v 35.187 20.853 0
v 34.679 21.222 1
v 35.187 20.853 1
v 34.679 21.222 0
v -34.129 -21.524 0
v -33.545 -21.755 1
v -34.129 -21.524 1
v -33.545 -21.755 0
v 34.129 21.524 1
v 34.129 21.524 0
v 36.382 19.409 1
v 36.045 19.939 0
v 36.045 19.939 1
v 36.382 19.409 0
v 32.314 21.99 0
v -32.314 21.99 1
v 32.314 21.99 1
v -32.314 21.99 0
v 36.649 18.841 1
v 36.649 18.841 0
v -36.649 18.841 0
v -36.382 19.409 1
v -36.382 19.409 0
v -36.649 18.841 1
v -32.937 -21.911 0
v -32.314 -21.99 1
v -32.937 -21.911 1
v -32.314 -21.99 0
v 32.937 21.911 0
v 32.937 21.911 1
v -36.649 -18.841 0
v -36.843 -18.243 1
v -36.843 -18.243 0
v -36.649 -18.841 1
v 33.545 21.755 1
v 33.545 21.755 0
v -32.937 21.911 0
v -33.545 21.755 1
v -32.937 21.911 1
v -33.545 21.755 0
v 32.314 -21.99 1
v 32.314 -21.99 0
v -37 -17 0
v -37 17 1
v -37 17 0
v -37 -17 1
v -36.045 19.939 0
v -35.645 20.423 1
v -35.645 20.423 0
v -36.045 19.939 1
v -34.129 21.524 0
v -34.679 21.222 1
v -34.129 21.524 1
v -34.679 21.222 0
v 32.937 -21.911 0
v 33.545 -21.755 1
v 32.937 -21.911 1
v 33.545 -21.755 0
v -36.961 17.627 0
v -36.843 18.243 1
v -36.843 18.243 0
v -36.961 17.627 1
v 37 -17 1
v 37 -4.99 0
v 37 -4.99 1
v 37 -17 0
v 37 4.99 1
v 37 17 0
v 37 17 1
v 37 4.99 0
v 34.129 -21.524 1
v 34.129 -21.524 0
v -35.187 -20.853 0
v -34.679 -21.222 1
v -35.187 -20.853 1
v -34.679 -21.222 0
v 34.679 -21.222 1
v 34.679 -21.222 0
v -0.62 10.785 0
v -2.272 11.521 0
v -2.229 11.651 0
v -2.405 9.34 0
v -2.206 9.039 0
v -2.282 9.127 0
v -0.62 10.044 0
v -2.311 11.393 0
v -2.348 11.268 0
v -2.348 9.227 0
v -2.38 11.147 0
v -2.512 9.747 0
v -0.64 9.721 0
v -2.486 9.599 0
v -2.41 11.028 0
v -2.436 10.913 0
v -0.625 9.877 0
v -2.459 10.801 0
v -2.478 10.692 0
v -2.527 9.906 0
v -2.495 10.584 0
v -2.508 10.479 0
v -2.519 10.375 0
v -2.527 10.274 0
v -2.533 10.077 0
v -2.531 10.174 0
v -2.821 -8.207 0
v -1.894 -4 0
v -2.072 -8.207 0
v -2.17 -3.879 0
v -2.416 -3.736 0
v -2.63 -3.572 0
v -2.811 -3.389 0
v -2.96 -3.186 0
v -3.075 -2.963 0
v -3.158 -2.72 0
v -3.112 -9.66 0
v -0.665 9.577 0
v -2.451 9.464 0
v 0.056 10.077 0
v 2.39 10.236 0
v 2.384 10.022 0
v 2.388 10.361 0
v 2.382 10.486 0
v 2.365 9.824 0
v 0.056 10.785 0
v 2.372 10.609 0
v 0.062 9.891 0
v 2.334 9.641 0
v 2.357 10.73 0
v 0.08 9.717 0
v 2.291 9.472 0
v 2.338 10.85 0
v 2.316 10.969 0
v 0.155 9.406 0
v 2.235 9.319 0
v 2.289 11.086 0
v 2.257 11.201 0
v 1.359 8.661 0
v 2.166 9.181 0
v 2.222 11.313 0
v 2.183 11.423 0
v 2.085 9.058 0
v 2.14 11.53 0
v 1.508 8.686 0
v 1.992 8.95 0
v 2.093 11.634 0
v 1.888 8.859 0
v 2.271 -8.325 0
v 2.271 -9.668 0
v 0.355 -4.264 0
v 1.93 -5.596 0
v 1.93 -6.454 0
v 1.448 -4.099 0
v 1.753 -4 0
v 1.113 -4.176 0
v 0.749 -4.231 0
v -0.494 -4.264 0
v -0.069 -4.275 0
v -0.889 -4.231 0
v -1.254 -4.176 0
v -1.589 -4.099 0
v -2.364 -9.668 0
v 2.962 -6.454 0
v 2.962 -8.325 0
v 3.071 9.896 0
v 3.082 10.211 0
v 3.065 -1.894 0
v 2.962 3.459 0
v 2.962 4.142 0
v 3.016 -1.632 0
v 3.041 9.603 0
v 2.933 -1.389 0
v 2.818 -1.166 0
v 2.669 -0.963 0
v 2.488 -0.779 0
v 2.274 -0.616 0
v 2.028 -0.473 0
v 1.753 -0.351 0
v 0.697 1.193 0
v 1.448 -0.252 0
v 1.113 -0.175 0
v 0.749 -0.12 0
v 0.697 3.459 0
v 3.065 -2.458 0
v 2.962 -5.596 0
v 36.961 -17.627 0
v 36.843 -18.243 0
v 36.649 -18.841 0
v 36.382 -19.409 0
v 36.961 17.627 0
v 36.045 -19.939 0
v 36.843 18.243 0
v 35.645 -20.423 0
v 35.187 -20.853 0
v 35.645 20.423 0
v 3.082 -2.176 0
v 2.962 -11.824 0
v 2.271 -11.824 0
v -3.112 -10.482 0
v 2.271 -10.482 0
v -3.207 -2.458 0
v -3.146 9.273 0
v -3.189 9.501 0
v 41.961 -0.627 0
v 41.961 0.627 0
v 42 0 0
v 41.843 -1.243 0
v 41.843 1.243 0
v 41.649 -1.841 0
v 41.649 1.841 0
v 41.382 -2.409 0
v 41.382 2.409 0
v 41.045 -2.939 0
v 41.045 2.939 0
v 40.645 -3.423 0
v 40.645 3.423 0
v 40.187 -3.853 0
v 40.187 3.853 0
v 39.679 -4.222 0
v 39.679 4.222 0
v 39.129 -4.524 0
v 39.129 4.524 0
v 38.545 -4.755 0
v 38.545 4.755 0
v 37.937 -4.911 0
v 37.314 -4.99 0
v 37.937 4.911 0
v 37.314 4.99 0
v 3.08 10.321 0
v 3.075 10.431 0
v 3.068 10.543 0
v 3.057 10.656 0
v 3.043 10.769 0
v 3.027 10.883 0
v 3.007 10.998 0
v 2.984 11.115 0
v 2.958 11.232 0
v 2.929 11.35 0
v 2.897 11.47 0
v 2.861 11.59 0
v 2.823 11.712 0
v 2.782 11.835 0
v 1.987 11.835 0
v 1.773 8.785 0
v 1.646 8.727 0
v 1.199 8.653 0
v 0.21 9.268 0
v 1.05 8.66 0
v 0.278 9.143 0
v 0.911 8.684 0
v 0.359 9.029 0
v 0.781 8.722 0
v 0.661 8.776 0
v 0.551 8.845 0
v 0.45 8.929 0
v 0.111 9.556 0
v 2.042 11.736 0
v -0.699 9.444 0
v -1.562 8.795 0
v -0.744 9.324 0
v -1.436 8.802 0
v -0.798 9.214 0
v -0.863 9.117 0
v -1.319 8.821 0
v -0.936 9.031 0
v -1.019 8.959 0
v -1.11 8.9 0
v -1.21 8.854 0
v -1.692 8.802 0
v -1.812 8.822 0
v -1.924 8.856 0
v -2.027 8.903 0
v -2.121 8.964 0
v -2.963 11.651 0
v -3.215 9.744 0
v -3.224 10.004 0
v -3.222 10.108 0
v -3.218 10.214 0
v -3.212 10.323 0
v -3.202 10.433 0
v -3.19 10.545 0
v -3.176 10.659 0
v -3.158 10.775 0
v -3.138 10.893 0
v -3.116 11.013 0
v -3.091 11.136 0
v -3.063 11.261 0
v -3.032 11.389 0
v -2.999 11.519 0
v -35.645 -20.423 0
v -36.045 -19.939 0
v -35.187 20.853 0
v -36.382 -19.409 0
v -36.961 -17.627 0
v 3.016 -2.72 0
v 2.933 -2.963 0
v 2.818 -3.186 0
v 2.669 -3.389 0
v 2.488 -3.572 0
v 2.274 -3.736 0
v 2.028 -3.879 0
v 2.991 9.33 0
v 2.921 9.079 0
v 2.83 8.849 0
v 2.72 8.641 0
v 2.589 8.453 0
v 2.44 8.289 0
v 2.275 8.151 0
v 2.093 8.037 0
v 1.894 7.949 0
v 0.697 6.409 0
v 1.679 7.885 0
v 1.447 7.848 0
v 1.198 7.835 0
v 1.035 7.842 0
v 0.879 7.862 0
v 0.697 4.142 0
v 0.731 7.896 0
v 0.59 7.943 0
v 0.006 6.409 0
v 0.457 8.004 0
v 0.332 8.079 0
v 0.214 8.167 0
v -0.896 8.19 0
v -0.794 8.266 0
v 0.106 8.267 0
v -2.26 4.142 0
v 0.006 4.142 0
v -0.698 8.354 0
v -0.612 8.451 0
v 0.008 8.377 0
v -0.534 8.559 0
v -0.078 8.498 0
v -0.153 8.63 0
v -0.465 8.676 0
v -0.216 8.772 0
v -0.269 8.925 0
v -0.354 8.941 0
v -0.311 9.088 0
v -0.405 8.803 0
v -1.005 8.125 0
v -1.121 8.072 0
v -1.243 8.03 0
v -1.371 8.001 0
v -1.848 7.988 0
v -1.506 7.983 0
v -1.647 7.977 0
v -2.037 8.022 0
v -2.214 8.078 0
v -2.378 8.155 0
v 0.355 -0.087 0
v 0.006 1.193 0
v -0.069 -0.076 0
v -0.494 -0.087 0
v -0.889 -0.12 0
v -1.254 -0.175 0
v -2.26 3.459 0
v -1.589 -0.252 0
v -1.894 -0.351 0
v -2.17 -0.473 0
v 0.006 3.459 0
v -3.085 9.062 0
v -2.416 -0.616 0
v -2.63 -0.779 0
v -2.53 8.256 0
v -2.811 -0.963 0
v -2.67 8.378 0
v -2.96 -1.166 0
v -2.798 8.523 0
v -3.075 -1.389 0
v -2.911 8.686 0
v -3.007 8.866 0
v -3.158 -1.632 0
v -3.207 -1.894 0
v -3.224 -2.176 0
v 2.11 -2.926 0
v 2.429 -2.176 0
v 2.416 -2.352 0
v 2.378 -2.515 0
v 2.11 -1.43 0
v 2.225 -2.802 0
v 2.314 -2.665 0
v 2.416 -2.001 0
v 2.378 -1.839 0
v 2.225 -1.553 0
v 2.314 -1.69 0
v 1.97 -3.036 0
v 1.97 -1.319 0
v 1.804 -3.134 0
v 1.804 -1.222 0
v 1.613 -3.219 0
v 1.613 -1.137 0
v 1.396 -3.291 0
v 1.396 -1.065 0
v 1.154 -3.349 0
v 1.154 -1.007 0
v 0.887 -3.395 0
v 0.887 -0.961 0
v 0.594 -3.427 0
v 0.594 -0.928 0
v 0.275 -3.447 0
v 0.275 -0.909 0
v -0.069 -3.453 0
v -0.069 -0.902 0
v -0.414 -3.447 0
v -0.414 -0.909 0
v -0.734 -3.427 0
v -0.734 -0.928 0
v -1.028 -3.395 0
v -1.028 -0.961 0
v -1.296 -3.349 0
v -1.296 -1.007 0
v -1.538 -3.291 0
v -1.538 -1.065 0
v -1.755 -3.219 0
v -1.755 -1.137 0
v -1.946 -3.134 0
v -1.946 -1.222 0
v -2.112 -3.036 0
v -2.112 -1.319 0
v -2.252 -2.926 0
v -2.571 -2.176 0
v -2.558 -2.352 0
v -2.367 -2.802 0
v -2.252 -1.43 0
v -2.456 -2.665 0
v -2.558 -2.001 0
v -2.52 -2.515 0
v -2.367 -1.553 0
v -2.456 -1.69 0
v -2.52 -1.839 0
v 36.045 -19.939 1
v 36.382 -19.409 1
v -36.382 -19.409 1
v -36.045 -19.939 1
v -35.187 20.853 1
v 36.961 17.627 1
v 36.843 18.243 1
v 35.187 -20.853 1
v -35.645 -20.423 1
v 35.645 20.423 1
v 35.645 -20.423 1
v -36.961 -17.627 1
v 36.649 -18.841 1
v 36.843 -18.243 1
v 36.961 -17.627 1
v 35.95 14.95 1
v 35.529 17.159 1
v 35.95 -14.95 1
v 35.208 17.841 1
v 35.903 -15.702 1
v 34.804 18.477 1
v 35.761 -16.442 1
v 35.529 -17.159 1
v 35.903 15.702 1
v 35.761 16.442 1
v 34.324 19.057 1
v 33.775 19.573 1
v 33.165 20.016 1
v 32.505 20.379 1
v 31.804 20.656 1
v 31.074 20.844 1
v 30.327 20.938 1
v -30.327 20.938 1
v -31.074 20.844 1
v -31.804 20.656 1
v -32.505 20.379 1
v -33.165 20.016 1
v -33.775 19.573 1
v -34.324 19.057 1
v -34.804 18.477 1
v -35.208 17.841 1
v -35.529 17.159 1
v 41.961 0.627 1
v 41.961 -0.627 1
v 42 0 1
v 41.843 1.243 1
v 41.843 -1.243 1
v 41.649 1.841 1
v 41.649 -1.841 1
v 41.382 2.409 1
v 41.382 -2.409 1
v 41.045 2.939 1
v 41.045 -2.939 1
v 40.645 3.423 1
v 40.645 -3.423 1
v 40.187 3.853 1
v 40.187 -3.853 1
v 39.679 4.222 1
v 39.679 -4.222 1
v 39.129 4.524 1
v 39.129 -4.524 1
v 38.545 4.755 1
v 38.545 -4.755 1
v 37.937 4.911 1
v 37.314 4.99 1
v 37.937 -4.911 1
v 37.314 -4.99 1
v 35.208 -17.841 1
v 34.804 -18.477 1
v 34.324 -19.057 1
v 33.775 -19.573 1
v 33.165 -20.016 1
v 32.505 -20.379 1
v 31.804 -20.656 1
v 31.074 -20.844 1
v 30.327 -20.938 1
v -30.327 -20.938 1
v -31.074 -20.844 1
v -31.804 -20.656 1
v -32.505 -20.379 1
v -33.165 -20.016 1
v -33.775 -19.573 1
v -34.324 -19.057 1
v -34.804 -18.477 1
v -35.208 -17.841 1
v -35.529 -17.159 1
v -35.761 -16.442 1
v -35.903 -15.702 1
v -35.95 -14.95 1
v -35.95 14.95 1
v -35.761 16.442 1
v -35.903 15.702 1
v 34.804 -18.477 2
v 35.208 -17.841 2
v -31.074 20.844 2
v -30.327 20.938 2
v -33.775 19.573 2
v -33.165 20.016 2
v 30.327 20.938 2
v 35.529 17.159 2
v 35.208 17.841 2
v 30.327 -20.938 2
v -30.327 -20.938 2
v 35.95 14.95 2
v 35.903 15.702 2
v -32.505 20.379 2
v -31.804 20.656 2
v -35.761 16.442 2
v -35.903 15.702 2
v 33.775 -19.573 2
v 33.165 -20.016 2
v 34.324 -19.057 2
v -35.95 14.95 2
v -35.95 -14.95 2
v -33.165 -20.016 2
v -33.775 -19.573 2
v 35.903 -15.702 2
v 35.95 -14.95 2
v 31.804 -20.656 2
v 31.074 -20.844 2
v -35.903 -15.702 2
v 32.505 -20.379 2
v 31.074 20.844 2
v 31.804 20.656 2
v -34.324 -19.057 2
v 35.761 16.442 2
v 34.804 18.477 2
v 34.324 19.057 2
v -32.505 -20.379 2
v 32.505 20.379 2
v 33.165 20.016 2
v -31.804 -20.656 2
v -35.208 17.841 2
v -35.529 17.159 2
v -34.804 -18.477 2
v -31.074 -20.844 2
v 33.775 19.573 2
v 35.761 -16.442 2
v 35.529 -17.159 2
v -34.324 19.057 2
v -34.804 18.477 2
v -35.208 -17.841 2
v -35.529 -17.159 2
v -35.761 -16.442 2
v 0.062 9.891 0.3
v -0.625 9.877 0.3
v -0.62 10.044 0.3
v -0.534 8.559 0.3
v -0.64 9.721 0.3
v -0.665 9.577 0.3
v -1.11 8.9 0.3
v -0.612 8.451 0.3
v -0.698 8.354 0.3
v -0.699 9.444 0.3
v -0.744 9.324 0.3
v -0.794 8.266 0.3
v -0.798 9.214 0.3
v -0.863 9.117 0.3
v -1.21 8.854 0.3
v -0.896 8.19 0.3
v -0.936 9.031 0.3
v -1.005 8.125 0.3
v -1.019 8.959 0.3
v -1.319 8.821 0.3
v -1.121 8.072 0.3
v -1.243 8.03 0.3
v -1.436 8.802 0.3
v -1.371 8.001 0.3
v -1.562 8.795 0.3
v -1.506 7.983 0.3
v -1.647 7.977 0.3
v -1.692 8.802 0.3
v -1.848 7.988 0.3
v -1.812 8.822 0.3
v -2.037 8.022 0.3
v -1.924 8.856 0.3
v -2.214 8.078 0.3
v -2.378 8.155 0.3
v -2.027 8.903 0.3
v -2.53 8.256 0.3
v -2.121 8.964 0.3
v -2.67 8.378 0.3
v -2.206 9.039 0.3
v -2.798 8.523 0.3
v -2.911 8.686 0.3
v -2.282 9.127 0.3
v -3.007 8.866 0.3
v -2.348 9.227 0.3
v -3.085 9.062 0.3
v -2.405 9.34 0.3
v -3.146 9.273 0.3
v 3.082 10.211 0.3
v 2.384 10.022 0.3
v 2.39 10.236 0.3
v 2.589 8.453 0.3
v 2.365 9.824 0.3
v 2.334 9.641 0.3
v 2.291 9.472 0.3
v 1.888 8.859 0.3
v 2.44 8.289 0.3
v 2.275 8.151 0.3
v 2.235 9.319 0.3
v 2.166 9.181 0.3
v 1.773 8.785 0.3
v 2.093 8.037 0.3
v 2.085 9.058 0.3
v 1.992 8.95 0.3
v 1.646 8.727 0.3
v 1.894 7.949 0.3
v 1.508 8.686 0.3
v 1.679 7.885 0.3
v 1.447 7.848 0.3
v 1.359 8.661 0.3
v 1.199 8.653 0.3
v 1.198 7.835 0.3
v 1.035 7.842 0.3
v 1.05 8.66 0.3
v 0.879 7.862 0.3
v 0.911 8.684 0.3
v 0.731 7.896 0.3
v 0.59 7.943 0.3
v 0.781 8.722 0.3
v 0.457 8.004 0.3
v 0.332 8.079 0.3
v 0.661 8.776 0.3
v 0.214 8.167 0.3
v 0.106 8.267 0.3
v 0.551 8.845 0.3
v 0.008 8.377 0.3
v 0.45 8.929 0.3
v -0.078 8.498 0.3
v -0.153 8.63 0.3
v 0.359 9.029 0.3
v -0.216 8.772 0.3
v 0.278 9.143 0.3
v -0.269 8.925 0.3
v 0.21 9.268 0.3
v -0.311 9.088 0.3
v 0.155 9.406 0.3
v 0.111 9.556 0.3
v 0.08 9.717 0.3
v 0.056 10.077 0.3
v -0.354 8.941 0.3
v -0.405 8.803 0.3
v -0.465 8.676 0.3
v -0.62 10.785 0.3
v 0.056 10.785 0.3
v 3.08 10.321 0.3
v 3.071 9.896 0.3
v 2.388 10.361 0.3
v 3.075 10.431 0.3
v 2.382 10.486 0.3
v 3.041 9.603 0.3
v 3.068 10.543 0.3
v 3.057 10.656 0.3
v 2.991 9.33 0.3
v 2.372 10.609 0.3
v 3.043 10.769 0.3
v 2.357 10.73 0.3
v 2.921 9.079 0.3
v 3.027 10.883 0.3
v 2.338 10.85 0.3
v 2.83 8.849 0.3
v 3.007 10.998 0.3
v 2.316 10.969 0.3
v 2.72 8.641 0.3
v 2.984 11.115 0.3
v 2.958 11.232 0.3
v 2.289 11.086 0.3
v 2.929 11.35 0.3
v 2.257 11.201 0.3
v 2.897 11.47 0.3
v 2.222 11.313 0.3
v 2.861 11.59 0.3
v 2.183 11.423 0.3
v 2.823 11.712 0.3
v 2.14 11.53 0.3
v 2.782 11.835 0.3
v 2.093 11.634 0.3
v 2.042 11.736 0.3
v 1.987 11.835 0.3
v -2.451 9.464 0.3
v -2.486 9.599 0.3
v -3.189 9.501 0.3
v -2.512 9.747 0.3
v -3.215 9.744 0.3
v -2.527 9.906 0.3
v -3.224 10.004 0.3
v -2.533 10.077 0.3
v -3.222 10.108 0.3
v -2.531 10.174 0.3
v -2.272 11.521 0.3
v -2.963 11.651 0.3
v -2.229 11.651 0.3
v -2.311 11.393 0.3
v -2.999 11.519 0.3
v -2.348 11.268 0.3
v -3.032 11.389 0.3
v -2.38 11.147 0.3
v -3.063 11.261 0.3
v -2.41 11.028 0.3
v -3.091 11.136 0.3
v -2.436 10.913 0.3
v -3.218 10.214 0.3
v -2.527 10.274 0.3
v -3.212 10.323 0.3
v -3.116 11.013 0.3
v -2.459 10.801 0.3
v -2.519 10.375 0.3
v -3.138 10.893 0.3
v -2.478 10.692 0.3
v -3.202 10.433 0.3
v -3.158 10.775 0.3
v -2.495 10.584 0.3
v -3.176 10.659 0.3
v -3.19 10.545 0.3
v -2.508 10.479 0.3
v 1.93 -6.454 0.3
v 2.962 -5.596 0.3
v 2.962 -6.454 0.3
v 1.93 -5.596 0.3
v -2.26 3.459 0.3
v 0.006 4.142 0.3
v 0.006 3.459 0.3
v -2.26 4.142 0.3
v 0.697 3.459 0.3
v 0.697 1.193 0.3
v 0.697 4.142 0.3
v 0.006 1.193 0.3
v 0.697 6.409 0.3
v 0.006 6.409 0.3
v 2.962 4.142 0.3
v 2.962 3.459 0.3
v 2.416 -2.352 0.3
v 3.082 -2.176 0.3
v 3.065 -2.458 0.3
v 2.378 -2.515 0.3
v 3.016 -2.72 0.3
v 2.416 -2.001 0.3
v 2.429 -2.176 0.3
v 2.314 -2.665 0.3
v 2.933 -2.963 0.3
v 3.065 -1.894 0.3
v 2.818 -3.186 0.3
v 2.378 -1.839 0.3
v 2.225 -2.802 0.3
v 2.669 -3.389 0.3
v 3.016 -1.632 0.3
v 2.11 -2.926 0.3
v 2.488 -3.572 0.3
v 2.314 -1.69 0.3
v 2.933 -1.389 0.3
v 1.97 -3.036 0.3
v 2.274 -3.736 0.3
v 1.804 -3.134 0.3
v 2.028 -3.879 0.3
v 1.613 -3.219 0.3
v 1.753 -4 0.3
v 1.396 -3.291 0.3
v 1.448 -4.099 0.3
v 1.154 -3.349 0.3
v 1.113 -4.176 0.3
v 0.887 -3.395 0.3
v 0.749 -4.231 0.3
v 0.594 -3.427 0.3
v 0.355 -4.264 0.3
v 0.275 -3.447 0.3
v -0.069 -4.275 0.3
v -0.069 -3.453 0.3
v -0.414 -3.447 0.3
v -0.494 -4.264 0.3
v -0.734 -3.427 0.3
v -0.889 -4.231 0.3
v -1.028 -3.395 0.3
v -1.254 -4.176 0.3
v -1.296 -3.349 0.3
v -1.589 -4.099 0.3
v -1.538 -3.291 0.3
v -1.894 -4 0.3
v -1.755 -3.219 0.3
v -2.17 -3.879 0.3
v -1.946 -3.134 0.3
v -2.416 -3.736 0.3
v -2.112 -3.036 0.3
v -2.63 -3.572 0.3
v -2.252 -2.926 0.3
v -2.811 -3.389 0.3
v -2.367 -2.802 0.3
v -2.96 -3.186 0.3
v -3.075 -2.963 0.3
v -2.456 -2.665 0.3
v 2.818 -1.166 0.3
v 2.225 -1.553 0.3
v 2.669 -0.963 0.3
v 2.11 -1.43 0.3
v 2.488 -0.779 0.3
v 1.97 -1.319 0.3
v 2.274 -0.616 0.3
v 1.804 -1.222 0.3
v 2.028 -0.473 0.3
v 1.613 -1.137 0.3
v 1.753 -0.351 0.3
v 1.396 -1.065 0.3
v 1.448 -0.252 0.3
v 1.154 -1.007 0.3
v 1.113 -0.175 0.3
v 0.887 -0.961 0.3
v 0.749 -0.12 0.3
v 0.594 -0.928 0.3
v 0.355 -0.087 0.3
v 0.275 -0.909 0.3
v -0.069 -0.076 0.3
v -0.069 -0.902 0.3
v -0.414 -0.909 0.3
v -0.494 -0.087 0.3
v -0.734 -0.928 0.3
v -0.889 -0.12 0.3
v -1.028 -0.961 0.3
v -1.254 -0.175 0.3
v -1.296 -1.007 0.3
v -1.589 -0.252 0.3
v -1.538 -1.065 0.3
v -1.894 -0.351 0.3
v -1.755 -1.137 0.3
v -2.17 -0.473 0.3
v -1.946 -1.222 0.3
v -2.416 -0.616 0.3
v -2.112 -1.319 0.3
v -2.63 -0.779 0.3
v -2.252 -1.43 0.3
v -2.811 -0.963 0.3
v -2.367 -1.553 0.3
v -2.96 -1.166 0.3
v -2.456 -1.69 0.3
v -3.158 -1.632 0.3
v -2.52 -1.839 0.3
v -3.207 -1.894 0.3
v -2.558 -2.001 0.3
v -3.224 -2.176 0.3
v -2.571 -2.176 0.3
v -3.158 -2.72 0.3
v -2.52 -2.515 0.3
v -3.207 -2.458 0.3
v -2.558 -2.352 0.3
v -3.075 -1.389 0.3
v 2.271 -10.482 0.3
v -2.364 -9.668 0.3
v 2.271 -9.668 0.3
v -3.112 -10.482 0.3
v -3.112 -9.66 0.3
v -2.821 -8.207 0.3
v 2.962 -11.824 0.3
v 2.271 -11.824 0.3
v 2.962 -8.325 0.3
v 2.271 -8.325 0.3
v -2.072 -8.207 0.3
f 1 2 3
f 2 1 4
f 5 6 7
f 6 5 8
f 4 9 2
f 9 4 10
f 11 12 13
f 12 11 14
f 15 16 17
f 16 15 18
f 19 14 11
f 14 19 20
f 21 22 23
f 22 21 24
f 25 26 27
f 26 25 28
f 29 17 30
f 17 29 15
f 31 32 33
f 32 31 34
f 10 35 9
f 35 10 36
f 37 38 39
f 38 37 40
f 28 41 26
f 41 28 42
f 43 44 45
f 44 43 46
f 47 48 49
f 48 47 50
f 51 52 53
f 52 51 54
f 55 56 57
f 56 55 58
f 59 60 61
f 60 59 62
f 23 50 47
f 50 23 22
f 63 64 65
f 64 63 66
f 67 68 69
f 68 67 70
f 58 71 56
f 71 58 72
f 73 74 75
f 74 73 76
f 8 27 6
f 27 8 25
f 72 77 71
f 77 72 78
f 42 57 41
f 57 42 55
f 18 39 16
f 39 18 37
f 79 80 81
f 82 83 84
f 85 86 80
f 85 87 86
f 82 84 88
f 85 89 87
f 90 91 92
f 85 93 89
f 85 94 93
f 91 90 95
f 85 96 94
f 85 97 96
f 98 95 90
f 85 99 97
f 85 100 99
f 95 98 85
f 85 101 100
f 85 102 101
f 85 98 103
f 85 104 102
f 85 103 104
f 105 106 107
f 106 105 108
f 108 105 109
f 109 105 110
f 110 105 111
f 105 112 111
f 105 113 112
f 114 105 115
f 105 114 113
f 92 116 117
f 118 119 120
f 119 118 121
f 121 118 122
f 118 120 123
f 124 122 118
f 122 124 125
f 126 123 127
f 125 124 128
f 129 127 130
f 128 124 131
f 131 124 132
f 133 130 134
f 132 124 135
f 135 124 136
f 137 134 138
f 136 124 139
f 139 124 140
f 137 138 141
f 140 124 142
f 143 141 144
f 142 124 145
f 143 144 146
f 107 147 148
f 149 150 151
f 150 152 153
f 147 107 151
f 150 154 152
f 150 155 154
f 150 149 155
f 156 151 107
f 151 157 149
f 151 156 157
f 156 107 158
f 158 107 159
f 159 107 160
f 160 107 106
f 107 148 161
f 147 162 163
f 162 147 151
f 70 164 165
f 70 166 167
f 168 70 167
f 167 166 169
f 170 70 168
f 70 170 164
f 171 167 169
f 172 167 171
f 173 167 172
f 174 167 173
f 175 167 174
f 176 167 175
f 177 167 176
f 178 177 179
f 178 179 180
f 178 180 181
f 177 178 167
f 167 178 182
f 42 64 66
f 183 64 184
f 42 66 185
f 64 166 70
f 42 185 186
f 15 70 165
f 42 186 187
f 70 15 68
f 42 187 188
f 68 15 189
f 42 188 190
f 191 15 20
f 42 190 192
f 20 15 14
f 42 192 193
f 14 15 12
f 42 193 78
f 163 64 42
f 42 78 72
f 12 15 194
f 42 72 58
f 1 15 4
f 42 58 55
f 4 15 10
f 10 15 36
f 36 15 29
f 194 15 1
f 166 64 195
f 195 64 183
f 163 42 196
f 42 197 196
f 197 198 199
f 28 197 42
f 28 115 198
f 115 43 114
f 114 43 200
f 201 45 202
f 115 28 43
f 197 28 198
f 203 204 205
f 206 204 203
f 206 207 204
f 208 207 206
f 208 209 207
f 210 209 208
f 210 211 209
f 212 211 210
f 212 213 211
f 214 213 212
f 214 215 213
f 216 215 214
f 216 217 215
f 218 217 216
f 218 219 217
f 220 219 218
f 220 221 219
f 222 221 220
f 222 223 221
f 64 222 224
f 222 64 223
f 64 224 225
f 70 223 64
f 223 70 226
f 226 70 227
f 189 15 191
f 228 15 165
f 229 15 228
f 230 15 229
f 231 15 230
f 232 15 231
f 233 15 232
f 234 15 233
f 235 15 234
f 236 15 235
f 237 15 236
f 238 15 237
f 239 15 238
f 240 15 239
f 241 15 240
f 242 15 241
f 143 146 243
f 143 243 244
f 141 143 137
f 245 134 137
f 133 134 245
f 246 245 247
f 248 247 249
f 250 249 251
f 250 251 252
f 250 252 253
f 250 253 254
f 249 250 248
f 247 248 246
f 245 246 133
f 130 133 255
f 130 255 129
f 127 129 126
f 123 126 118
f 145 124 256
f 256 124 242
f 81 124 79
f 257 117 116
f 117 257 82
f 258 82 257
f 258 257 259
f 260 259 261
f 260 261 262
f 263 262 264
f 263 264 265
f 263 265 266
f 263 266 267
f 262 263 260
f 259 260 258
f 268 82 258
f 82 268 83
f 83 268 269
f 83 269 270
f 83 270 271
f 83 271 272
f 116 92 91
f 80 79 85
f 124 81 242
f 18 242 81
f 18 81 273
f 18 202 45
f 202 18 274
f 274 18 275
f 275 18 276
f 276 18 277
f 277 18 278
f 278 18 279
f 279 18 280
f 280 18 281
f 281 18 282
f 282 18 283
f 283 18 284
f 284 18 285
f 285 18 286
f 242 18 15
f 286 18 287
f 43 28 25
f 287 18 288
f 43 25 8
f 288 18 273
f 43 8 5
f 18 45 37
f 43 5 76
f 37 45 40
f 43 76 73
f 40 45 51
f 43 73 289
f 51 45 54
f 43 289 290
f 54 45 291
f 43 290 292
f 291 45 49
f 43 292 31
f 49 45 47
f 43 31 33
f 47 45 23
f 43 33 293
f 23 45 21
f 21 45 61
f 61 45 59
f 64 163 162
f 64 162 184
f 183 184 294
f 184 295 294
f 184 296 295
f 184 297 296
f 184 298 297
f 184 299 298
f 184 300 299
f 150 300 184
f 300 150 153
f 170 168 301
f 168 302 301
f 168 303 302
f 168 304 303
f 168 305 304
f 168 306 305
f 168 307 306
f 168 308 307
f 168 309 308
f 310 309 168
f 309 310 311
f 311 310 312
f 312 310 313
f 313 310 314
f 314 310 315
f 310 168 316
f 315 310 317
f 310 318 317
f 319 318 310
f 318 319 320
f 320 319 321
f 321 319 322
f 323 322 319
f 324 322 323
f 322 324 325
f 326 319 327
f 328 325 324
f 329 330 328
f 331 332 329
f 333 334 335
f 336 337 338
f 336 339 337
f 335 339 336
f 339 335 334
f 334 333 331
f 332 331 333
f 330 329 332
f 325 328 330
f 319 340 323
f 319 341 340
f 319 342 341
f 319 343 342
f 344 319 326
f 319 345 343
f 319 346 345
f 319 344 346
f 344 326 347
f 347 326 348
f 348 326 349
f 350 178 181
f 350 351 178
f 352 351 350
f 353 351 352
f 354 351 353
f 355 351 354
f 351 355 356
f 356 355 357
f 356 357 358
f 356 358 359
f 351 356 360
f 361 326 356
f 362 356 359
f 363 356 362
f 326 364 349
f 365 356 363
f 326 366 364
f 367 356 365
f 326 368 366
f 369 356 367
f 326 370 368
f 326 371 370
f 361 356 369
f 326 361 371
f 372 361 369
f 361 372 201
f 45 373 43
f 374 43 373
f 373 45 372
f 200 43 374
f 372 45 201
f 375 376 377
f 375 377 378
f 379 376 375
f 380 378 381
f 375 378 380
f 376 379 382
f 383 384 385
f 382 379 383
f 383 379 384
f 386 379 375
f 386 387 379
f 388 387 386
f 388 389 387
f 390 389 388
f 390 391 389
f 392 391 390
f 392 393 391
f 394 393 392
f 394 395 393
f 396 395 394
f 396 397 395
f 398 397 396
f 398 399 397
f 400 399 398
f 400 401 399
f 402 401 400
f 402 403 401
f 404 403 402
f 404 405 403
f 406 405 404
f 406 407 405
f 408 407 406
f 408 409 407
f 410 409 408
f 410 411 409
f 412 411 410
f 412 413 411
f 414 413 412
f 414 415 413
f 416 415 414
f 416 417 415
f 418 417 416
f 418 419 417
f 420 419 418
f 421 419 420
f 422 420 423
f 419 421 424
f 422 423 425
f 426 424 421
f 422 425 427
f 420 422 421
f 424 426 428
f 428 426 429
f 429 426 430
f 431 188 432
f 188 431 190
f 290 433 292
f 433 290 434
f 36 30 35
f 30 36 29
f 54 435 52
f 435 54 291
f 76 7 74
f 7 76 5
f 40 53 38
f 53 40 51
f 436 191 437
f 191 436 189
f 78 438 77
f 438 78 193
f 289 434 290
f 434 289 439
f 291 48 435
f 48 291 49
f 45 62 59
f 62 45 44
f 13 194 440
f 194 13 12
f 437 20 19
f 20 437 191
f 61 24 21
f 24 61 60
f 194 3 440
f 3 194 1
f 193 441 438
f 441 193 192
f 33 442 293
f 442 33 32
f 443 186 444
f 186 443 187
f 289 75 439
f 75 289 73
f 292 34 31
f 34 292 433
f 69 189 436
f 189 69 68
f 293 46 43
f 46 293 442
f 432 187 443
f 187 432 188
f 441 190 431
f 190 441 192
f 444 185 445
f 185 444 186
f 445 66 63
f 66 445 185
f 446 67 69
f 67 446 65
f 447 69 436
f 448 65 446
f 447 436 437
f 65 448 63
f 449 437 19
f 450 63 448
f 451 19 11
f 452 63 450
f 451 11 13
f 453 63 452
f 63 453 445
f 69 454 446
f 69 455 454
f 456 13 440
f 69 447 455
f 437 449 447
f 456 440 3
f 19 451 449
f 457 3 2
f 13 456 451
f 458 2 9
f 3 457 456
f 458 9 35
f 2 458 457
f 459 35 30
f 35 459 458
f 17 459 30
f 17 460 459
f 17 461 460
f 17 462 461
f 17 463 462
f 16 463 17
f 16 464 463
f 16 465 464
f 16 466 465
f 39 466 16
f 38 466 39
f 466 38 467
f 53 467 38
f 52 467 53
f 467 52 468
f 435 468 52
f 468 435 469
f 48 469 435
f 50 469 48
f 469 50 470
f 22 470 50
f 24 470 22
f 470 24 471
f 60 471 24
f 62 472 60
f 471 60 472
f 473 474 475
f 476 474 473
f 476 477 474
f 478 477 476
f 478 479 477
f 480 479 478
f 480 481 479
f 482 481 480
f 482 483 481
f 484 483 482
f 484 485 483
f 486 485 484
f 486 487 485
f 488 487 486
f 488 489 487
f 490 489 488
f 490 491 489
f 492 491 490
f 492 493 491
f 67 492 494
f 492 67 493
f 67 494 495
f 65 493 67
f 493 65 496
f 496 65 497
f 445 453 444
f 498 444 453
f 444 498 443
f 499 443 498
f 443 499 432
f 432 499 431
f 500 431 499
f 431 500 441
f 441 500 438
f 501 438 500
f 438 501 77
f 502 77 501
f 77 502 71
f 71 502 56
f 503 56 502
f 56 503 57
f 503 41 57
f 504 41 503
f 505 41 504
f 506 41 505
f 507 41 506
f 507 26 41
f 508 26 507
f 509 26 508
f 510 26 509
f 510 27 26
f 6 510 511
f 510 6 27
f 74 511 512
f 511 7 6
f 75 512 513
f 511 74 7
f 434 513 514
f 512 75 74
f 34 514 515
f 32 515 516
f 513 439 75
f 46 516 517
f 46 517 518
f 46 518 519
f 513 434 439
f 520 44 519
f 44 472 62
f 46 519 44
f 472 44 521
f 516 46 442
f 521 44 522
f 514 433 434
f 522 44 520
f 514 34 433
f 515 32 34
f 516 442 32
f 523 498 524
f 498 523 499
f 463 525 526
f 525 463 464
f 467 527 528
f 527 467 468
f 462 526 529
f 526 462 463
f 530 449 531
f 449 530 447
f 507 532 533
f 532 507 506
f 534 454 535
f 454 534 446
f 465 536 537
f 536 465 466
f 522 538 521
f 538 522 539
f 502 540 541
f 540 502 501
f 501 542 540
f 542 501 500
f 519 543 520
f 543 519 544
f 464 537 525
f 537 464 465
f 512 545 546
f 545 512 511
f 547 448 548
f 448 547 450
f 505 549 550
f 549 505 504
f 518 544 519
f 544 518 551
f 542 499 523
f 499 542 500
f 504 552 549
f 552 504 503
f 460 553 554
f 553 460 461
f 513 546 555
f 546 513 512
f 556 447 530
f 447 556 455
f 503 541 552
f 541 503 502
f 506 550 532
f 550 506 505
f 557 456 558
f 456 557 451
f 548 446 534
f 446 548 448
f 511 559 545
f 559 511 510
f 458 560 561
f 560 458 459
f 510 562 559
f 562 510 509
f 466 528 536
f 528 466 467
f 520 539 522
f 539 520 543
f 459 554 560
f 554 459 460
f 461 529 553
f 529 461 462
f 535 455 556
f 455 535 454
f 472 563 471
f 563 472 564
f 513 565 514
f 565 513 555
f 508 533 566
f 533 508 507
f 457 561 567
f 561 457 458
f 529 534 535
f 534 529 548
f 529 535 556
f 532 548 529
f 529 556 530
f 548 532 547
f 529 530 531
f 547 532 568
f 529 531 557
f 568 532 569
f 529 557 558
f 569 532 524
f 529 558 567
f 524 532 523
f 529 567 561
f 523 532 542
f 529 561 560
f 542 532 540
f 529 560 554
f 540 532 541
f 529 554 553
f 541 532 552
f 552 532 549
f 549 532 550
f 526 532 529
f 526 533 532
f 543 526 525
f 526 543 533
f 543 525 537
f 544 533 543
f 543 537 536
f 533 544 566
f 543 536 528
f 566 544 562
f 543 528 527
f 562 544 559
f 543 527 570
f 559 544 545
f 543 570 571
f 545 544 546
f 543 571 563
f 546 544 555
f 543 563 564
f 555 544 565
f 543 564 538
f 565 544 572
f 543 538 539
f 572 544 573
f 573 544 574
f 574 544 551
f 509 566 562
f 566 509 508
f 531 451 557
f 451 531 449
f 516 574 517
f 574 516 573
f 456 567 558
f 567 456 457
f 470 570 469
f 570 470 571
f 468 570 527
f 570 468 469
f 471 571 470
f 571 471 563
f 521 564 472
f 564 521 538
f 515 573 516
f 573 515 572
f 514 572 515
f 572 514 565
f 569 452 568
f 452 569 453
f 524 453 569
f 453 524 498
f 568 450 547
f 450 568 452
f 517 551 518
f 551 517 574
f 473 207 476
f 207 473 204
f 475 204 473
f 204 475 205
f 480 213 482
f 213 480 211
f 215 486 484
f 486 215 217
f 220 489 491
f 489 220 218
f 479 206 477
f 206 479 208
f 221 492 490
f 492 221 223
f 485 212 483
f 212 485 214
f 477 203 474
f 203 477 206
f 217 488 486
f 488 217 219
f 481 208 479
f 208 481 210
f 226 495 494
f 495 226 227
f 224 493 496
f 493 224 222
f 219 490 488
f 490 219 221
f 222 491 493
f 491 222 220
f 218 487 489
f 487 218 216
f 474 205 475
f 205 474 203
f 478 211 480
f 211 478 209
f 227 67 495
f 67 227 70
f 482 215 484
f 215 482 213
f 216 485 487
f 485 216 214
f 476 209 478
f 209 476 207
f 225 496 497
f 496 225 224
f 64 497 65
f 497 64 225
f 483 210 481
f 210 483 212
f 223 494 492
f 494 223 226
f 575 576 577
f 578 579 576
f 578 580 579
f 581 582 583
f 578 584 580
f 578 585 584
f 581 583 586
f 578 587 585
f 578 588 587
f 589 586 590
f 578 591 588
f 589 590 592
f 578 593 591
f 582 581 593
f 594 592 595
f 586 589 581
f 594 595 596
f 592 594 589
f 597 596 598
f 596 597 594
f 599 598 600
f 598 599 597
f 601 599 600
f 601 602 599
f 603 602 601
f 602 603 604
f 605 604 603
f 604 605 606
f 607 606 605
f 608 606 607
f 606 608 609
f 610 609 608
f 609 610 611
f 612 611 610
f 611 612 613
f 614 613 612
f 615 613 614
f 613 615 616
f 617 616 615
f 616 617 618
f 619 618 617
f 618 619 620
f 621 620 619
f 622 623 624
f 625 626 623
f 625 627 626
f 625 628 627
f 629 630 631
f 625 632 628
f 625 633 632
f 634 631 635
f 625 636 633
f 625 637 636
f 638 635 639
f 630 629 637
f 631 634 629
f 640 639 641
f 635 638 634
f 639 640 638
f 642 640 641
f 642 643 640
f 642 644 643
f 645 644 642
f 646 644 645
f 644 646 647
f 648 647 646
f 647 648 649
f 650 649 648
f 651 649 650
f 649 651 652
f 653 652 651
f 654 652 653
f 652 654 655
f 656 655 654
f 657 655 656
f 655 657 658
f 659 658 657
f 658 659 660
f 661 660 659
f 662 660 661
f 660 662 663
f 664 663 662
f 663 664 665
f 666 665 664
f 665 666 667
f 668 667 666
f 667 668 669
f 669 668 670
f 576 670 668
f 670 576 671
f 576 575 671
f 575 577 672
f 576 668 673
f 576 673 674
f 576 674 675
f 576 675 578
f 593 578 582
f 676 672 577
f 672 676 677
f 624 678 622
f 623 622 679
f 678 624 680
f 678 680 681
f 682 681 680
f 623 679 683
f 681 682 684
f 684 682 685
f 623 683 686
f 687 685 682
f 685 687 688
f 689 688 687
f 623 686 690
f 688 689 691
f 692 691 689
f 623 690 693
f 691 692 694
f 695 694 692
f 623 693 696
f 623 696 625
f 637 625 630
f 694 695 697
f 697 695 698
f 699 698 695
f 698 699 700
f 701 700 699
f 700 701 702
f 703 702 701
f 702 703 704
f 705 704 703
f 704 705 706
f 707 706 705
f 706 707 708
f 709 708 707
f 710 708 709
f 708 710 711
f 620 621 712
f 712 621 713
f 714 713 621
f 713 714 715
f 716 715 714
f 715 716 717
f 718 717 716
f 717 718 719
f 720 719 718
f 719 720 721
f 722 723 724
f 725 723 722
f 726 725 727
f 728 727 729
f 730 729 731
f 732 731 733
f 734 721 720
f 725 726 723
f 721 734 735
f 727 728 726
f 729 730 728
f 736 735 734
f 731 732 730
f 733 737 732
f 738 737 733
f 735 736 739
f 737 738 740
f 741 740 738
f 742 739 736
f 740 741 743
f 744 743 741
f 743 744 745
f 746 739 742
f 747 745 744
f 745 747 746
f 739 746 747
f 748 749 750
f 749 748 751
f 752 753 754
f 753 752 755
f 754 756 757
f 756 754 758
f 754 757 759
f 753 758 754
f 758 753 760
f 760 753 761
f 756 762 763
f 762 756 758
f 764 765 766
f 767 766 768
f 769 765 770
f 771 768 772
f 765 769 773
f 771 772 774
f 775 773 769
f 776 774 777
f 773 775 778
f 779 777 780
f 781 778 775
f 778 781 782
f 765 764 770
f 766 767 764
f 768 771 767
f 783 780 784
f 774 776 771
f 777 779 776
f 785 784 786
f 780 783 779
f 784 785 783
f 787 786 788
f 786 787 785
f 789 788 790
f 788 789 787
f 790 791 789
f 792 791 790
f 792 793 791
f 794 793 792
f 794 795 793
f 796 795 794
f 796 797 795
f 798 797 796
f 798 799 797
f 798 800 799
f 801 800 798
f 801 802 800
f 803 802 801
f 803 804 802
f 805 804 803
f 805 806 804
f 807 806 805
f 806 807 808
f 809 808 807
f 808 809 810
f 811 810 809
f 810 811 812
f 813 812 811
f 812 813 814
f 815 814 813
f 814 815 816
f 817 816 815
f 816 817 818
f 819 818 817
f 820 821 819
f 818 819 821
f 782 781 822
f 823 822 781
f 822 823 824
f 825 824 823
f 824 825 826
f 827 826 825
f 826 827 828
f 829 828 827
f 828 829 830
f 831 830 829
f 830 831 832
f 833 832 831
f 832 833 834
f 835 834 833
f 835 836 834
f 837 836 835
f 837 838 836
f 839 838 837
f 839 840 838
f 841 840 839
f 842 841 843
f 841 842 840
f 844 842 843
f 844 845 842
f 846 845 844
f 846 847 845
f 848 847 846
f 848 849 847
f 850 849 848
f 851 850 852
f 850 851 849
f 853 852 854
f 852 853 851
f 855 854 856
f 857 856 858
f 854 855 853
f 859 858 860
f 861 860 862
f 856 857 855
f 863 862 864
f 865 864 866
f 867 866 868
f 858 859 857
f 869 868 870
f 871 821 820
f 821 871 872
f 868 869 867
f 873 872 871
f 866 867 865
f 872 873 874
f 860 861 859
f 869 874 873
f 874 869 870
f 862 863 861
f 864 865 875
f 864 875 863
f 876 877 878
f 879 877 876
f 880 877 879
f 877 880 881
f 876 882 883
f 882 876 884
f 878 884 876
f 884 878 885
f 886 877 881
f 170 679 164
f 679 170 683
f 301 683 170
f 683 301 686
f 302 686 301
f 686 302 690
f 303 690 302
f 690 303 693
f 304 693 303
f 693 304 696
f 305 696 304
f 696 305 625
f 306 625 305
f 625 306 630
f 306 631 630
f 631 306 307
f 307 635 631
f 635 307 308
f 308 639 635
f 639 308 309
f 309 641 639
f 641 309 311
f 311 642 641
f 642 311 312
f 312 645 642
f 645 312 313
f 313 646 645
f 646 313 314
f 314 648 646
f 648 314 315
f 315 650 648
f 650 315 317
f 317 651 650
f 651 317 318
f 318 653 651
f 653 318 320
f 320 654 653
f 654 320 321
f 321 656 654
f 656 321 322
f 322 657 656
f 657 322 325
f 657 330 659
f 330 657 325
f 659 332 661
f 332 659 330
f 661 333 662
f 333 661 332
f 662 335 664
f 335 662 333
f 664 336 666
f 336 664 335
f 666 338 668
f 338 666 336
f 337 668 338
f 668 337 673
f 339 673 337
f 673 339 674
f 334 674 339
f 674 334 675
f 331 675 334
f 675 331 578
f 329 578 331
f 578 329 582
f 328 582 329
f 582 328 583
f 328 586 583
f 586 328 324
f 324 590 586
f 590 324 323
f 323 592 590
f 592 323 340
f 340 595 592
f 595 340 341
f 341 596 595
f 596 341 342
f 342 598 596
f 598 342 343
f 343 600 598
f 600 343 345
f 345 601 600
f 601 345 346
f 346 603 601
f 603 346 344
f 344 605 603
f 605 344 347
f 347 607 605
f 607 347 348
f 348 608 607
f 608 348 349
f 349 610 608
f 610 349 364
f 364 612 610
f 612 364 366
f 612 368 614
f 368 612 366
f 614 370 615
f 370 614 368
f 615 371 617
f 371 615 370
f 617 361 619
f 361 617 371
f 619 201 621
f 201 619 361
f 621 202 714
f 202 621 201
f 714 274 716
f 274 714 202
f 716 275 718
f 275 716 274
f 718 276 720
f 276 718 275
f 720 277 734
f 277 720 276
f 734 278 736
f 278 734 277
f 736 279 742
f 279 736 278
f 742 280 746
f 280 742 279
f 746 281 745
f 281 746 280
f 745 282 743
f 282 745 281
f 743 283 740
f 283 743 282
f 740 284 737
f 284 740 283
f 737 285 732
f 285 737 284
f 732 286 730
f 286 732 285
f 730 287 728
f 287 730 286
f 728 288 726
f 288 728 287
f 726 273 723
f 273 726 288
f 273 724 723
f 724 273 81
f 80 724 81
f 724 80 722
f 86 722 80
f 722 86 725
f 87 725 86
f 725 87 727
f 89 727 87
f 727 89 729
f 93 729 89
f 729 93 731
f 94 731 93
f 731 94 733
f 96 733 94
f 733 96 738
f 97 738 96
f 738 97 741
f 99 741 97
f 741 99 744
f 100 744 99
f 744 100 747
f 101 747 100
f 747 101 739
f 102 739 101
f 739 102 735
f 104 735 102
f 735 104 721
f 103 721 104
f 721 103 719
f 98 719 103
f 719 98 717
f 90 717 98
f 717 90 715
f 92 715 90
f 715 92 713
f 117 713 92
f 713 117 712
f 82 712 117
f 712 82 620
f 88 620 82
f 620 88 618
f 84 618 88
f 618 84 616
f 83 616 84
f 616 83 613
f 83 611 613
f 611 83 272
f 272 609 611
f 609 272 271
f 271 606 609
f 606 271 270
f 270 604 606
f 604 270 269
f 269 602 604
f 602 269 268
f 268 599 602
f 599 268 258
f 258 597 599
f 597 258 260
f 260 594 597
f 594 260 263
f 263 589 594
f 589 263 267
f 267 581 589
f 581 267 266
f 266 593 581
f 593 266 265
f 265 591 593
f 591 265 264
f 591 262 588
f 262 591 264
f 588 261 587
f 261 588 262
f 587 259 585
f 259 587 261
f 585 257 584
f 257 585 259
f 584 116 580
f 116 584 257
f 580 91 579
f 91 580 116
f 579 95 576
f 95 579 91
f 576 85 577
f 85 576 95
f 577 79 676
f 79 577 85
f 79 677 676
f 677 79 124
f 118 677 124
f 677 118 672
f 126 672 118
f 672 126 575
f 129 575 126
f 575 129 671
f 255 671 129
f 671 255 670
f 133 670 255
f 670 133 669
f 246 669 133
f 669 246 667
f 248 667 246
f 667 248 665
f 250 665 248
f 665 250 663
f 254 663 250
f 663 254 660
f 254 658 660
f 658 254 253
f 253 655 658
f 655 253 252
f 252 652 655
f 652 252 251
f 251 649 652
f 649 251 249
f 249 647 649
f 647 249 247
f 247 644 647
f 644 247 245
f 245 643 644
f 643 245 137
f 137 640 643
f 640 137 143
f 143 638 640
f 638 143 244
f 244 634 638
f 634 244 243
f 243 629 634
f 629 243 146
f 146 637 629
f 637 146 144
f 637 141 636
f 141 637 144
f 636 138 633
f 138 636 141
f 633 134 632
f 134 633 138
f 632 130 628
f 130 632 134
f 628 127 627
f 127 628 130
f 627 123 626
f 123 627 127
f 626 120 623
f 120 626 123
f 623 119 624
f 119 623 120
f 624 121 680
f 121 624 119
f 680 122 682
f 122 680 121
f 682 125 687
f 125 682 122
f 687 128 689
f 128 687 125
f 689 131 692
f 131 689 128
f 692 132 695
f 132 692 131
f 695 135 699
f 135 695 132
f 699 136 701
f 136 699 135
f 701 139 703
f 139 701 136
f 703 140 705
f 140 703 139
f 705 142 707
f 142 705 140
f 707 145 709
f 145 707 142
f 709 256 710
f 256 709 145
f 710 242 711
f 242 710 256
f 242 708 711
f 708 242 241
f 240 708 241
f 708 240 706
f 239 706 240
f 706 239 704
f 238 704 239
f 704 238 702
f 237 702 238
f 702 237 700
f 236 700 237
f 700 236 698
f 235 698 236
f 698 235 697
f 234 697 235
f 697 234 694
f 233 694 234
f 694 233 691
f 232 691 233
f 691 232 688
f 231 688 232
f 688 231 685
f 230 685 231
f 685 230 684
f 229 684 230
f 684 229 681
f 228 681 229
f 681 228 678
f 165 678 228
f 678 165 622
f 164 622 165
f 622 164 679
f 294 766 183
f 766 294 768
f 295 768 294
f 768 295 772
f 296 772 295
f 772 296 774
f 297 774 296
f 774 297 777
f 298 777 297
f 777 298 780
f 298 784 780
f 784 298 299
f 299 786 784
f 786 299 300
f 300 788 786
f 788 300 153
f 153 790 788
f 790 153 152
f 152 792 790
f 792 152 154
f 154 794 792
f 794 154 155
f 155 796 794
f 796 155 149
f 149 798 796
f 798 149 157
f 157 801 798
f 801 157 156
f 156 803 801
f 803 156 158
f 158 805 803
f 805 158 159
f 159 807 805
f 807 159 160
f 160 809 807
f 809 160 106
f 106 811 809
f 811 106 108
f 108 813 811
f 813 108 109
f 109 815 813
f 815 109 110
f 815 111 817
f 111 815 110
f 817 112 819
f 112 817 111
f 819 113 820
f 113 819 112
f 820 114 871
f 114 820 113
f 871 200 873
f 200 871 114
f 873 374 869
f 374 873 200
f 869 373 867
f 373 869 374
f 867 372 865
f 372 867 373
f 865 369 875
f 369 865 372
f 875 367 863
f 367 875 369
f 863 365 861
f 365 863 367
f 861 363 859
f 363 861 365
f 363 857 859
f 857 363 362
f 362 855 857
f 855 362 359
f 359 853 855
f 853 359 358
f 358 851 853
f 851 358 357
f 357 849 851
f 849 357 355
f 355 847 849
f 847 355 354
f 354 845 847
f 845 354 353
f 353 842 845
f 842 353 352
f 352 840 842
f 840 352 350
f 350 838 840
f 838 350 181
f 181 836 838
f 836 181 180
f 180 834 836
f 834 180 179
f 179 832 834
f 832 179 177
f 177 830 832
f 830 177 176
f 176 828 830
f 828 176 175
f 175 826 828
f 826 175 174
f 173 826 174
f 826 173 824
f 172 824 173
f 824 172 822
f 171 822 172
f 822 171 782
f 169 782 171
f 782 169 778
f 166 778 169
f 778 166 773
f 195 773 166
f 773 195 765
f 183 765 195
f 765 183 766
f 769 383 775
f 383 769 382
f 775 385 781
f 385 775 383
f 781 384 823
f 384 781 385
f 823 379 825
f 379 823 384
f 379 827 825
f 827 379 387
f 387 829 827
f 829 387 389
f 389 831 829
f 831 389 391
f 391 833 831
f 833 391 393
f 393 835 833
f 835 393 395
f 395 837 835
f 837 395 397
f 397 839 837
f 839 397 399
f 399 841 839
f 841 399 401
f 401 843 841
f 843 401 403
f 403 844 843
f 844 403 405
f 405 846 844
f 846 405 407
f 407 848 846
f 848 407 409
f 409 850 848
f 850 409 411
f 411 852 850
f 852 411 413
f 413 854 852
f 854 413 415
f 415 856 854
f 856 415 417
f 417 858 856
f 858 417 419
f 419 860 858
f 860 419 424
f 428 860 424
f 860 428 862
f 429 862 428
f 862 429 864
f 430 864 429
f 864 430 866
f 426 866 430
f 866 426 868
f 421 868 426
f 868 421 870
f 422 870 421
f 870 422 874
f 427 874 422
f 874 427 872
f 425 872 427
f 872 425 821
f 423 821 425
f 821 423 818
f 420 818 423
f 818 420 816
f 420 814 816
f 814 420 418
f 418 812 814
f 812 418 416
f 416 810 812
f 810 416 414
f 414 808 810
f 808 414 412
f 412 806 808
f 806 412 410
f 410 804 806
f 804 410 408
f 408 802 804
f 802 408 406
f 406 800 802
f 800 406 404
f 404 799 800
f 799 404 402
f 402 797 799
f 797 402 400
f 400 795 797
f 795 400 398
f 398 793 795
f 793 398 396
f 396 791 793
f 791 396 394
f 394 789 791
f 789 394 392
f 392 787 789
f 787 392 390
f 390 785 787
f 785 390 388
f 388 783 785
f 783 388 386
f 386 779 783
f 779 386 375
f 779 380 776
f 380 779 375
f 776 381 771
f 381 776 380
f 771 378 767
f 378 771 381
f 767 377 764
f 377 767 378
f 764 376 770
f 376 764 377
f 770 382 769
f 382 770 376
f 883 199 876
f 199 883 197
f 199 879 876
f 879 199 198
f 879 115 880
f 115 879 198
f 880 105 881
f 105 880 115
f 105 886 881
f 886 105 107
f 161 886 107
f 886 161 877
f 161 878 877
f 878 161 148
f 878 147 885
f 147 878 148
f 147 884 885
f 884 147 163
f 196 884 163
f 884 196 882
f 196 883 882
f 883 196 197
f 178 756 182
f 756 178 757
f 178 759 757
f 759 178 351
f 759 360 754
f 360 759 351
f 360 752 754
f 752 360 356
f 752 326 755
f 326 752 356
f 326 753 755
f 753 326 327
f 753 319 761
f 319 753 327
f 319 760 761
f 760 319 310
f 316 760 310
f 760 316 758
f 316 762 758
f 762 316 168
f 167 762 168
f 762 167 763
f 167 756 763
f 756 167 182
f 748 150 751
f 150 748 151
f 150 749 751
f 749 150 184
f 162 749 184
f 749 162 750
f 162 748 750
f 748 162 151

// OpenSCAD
$fn = 50;


difference() {
	union() {
		translate(v = [0, 0, 0]) {
			rotate(a = [0, 0, 0]) {
				hull() {
					translate(v = [-32.0000000000, 17.0000000000, 0]) {
						rotate(a = [0, 0, 0]) {
							translate(v = [0, 0, 0]) {
								rotate(a = [0, 0, 0]) {
									cylinder(h = 1, r = 5);
								}
							}
						}
					}
					translate(v = [32.0000000000, 17.0000000000, 0]) {
						rotate(a = [0, 0, 0]) {
							translate(v = [0, 0, 0]) {
								rotate(a = [0, 0, 0]) {
									cylinder(h = 1, r = 5);
								}
							}
						}
					}
					translate(v = [-32.0000000000, -17.0000000000, 0]) {
						rotate(a = [0, 0, 0]) {
							translate(v = [0, 0, 0]) {
								rotate(a = [0, 0, 0]) {
									cylinder(h = 1, r = 5);
								}
							}
						}
					}
					translate(v = [32.0000000000, -17.0000000000, 0]) {
						rotate(a = [0, 0, 0]) {
							translate(v = [0, 0, 0]) {
								rotate(a = [0, 0, 0]) {
									cylinder(h = 1, r = 5);
								}
							}
						}
					}
				}
			}
		}
		translate(v = [0, 0, 0]) {
			rotate(a = [0, 0, 0]) {
				hull() {
					translate(v = [-29.9500000000, 14.9500000000, 0]) {
						rotate(a = [0, 0, 0]) {
							translate(v = [0, 0, 0]) {
								rotate(a = [0, 0, 0]) {
									cylinder(h = 2, r = 6);
								}
							}
						}
					}
					translate(v = [29.9500000000, 14.9500000000, 0]) {
						rotate(a = [0, 0, 0]) {
							translate(v = [0, 0, 0]) {
								rotate(a = [0, 0, 0]) {
									cylinder(h = 2, r = 6);
								}
							}
						}
					}
					translate(v = [-29.9500000000, -14.9500000000, 0]) {
						rotate(a = [0, 0, 0]) {
							translate(v = [0, 0, 0]) {
								rotate(a = [0, 0, 0]) {
									cylinder(h = 2, r = 6);
								}
							}
						}
					}
					translate(v = [29.9500000000, -14.9500000000, 0]) {
						rotate(a = [0, 0, 0]) {
							translate(v = [0, 0, 0]) {
								rotate(a = [0, 0, 0]) {
									cylinder(h = 2, r = 6);
								}
							}
						}
					}
				}
			}
		}
		translate(v = [37.0000000000, 0, 0.0000000000]) {
			rotate(a = [0, 0, 0]) {
				cylinder(h = 1, r = 5);
			}
		}
	}
	union() {
		translate(v = [0, 0, 0.3000000000]) {
			rotate(a = [0, 180, 90]) {
				linear_extrude(height = 0.3000000000) {
					text(font = "Candara:Light", halign = "center", size = 6, text = "3+0.1", valign = "center");
				}
			}
		}
	}
}
